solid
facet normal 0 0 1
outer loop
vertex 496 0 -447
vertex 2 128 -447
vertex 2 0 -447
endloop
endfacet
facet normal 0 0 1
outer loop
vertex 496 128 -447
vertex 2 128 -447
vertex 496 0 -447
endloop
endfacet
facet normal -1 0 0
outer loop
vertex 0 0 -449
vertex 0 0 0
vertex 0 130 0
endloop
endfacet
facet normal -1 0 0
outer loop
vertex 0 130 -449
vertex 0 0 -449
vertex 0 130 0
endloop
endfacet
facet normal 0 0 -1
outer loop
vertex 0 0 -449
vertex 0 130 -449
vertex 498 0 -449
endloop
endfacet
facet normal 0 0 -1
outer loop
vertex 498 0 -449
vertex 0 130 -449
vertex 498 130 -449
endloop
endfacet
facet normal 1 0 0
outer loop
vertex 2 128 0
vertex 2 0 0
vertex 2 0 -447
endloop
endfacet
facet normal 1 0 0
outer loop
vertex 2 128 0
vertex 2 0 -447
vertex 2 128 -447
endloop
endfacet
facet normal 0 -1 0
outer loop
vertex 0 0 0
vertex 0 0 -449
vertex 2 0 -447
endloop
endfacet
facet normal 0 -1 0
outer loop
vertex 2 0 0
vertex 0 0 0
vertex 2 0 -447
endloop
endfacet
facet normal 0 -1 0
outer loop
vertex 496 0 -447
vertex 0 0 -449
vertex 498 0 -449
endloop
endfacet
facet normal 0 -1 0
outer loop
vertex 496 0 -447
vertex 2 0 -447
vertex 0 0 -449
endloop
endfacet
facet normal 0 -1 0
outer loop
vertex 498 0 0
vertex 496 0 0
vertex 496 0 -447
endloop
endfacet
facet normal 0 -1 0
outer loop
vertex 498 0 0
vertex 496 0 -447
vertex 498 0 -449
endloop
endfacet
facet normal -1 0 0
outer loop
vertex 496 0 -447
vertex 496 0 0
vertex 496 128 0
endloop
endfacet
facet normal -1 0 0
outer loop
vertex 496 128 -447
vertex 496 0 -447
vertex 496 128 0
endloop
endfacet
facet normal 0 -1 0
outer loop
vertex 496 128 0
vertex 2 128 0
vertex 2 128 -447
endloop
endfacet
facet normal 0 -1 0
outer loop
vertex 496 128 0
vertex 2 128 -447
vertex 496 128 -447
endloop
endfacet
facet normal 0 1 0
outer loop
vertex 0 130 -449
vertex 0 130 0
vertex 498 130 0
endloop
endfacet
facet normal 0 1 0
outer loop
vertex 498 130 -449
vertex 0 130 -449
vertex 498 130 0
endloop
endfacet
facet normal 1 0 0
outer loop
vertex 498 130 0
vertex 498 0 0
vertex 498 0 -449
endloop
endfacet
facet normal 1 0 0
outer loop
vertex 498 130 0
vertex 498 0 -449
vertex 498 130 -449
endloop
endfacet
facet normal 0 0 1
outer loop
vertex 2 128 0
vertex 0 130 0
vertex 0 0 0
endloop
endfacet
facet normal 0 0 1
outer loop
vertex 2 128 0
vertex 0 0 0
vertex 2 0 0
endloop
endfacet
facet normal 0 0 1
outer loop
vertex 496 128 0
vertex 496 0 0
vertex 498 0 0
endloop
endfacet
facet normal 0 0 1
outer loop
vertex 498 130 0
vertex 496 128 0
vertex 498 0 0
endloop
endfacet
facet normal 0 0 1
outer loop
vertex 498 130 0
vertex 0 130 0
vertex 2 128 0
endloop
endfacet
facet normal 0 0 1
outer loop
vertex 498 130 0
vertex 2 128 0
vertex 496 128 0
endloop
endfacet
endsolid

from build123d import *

# Parameters (mm, degrees)
F0_W     = 498
F0_H     = 130
F1_DEPTH = 449
F2_T     = -2


with BuildPart() as f1:
    # F0 (on Top) → F1 (new body)
    with BuildSketch(Plane.XY):
        with Locations((249, 65)):
            Rectangle(F0_W, F0_H)
    extrude(amount=-F1_DEPTH)

    # F2
    f2_openings = [f1.faces().sort_by_distance(p)[0] for p in [
        (249, 0, -224.5),
        (249, 65, 0),
    ]]
    offset(amount=F2_T, openings=f2_openings)


solid = f1.part
